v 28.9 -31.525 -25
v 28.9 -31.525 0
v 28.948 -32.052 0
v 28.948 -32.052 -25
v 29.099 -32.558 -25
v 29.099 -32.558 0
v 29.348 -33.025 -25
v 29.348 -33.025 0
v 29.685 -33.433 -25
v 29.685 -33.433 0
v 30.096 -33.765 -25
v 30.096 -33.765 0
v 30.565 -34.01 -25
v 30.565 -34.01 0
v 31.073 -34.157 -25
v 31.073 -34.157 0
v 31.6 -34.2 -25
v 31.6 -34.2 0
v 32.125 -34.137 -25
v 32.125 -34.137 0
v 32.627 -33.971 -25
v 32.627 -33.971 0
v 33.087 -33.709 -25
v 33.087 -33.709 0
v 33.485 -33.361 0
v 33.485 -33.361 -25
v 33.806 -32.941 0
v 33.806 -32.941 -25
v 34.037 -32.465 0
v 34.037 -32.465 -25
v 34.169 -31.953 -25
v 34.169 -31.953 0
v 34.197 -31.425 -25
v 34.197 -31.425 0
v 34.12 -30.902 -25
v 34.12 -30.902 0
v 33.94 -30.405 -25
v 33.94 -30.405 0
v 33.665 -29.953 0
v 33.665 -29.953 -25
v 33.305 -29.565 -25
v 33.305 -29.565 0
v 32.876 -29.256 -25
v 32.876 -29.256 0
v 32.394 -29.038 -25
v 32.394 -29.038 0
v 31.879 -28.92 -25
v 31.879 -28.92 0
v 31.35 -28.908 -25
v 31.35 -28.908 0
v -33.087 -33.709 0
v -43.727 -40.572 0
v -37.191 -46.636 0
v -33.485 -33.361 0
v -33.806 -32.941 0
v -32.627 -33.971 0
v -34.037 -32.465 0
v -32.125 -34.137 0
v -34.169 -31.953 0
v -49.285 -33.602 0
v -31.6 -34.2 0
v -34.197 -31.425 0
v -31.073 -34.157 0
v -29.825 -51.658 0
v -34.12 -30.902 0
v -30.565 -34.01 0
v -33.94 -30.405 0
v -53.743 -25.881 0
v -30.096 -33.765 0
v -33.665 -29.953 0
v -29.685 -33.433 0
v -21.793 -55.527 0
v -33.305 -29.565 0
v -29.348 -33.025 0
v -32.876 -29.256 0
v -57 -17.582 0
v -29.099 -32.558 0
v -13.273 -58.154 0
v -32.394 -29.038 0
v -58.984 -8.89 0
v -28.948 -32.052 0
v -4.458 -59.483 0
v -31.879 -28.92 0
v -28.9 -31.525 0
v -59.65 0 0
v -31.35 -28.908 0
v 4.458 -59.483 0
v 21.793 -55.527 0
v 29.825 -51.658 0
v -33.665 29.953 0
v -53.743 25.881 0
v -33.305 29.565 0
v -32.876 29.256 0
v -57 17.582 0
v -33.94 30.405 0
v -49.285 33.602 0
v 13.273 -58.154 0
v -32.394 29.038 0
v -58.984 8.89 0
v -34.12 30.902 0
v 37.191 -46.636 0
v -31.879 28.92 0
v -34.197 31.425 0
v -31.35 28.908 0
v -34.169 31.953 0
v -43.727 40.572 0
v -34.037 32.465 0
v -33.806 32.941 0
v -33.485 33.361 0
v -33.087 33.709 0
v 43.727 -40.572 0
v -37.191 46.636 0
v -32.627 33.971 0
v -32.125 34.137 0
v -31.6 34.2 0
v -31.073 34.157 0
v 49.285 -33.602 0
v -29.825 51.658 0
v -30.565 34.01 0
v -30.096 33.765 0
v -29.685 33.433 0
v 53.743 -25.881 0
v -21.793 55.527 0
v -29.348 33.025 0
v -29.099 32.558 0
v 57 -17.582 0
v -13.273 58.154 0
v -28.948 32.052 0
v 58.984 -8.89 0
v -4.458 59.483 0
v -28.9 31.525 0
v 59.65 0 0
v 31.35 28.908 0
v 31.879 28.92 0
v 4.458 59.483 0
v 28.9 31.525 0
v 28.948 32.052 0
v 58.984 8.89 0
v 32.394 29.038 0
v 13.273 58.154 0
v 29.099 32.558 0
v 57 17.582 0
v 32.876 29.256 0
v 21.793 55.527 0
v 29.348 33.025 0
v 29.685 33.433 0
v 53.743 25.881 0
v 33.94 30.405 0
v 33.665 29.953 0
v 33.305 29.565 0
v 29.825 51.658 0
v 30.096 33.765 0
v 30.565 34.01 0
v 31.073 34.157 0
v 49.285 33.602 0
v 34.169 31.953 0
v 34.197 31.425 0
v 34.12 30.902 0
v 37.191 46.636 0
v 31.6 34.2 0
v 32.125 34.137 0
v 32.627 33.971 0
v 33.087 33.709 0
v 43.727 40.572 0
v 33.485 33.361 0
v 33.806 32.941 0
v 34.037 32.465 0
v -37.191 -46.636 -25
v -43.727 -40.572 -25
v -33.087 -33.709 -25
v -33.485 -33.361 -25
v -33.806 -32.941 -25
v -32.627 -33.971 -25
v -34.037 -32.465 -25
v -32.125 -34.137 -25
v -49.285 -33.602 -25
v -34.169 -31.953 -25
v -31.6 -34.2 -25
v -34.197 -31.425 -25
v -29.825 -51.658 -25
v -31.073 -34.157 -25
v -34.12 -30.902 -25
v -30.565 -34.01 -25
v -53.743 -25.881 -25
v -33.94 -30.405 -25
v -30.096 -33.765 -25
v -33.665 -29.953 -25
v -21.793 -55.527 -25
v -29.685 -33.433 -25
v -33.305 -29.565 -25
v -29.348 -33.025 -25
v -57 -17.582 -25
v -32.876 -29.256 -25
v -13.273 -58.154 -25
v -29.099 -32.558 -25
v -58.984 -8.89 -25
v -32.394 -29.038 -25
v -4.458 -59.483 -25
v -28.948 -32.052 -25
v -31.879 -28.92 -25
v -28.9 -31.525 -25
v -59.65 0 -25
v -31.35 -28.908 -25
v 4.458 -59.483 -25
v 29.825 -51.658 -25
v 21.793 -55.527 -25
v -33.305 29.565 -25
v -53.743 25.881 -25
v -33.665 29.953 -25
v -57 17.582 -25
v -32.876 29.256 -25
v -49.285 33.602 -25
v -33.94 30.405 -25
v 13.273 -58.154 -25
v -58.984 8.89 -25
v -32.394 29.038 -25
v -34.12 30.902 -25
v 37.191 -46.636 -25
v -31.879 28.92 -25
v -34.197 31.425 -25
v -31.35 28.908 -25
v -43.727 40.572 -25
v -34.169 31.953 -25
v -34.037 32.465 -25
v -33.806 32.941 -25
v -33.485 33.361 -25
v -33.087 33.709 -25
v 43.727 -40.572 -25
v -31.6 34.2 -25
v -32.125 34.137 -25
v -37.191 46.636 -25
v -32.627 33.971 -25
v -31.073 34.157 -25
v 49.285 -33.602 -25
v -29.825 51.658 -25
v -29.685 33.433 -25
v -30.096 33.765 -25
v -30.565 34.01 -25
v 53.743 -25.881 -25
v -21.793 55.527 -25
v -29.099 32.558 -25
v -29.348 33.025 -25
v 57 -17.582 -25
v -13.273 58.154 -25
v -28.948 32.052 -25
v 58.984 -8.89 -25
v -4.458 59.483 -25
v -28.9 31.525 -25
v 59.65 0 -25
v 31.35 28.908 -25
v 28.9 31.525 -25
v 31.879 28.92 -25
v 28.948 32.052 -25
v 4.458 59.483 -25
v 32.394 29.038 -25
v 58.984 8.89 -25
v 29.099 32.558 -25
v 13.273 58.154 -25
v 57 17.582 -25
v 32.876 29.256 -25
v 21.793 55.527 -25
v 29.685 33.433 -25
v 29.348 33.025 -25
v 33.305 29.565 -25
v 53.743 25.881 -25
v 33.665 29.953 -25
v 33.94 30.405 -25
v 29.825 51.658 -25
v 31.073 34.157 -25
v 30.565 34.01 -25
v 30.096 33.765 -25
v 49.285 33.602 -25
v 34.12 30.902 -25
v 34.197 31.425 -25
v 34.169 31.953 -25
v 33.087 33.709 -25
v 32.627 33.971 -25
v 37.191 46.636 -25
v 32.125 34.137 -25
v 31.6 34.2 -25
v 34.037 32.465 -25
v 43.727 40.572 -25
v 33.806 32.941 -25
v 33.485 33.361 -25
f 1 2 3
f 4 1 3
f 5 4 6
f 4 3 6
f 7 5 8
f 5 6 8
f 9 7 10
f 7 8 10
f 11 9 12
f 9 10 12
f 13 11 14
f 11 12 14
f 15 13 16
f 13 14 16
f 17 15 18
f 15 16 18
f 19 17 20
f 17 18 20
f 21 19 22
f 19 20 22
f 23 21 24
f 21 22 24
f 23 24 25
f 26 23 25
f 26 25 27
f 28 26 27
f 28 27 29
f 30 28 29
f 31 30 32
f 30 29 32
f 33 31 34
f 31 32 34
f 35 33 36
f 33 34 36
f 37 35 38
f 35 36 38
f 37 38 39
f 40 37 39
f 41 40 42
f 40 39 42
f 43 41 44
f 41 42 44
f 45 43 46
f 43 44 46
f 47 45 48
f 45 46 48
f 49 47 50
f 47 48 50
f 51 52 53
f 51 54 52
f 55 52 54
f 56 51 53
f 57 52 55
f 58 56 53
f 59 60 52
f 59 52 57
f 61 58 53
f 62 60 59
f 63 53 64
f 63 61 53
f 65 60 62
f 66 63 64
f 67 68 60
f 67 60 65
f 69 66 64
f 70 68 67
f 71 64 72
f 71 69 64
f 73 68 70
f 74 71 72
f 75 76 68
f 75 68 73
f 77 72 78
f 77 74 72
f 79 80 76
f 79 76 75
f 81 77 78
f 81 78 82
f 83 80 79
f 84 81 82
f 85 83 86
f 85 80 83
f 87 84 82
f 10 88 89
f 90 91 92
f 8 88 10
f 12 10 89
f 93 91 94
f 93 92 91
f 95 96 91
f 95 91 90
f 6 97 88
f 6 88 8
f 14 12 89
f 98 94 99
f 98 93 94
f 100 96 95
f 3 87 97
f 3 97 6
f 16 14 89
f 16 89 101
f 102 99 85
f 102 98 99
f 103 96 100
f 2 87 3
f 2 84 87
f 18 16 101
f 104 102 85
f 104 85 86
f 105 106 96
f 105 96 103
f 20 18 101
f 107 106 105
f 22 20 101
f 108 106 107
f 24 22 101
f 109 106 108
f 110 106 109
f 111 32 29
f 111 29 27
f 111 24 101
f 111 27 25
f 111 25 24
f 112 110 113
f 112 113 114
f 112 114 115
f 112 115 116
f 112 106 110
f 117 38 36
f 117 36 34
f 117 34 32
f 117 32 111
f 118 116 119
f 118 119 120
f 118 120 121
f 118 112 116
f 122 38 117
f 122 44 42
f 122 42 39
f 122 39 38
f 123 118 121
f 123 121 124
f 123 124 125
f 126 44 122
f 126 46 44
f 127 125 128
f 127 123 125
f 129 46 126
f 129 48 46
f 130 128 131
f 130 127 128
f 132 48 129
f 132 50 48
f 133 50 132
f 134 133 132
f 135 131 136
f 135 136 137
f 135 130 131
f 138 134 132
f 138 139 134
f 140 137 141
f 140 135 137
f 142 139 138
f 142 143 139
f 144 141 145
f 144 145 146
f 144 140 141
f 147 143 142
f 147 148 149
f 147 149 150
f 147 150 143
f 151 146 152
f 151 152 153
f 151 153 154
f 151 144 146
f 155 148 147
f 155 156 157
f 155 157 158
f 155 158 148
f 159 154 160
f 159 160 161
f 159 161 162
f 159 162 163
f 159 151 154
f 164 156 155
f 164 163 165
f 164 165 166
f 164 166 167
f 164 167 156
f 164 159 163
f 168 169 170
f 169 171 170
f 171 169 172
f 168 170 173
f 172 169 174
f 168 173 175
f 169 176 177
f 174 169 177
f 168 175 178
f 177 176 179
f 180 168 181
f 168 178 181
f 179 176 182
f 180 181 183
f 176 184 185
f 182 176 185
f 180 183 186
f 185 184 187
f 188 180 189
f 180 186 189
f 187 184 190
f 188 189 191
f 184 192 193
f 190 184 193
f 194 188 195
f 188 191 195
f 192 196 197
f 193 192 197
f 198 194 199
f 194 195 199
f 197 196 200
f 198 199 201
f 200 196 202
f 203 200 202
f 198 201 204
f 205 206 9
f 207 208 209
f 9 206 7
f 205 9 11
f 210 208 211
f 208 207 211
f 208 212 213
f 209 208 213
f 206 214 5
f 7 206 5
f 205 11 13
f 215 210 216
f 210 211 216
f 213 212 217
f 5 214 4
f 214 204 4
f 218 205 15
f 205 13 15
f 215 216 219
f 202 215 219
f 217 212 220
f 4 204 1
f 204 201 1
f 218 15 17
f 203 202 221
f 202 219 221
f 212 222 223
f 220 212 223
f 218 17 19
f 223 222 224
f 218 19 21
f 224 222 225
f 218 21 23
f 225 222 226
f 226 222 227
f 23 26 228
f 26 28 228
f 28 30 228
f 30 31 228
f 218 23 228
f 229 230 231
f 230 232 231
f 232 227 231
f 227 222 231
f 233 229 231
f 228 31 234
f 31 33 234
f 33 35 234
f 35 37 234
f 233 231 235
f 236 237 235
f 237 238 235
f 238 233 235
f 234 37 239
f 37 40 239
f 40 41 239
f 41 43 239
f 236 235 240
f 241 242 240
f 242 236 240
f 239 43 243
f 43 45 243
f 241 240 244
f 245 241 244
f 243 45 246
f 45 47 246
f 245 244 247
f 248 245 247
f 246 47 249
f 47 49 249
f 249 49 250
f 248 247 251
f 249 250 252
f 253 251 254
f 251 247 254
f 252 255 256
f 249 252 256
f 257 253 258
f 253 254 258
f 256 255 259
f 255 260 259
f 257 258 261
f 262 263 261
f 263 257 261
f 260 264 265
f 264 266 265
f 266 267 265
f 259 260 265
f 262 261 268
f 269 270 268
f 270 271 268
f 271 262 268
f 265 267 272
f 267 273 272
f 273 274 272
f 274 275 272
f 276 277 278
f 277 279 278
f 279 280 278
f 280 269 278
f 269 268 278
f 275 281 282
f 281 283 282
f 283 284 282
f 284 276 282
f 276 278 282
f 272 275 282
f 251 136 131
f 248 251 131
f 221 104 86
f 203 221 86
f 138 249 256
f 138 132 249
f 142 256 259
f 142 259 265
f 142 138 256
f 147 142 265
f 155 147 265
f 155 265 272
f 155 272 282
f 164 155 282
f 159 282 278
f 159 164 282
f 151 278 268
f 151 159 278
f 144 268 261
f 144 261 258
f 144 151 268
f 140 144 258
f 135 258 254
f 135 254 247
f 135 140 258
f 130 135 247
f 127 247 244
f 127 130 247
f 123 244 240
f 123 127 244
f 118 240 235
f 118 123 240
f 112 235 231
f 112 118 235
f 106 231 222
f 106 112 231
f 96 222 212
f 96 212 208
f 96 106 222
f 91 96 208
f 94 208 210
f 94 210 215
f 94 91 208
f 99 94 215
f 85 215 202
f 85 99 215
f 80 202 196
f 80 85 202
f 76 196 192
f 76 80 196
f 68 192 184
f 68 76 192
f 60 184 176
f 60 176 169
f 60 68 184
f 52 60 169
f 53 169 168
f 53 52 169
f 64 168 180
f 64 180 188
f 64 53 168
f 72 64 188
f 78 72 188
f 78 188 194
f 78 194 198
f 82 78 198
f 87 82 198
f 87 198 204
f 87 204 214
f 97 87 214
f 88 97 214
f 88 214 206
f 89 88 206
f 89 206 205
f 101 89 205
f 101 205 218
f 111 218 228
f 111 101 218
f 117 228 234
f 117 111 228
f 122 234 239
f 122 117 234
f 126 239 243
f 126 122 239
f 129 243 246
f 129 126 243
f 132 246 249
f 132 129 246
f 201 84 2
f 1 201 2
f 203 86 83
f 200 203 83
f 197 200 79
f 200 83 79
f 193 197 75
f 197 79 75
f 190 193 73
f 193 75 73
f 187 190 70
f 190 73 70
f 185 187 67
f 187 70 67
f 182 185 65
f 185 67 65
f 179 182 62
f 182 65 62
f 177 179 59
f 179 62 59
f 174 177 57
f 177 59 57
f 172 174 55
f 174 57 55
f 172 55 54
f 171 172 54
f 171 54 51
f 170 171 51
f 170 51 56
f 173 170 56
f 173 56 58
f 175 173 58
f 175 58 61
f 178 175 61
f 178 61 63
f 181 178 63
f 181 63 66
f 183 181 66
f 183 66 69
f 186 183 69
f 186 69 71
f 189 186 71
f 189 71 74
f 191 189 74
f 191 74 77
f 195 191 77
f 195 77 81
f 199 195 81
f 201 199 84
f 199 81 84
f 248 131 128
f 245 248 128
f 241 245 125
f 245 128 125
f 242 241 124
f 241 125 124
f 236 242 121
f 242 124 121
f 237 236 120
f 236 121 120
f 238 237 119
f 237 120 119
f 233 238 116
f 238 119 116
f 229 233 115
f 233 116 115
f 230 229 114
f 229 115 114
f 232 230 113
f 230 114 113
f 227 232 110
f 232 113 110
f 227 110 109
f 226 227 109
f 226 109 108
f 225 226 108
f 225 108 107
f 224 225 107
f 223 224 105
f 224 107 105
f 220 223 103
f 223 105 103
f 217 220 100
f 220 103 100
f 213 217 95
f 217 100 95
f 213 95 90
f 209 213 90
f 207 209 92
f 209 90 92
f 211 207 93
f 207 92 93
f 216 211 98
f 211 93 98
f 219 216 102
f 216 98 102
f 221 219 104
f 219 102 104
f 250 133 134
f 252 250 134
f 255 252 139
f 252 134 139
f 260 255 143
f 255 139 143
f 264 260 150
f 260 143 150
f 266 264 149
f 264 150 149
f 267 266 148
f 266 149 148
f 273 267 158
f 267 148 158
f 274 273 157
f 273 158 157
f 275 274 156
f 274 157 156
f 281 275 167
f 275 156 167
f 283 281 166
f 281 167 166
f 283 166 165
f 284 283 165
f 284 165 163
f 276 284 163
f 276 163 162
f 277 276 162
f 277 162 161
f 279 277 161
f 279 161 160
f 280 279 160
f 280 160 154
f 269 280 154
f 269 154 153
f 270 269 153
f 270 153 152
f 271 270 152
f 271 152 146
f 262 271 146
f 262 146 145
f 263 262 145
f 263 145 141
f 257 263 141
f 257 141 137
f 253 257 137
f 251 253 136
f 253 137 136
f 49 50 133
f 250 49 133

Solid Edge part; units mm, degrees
sketch "Sketch1" plane through (0, 0, 0) normal (0, 0, 1) x (1, 0, 0)
  circle A0 centre (0, 0) radius 59.65
extrude "Protrusion1" add sketch "Sketch1" against normal blind 25
sketch "Sketch2" plane through (0, 0, 0) normal (0, 0, 1) x (1, 0, 0)
  circle A0 centre (31.55, 31.55) radius 2.65
  circle A1 centre (-31.55, 31.55) radius 2.65
  circle A2 centre (31.55, -31.55) radius 2.65
  circle A3 centre (-31.55, -31.55) radius 2.65
extrude "ExtrudedCutout_2" cut sketch "Sketch2" against normal blind 25
sketch "Sketch3" plane through (0, 0, 0) normal (0, 0, 1) x (1, 0, 0)
  line L0 (-31.35, -31.525) -> (31.35, -31.525)
  line L1 (31.35, -31.525) -> (31.35, 31.525)
  line L2 (31.35, 31.525) -> (-31.35, 31.525)
  line L3 (-31.35, 31.525) -> (-31.35, -31.525)
extrude "ExtrudedCutout_7" cut sketch "Sketch3" against normal blind 25
